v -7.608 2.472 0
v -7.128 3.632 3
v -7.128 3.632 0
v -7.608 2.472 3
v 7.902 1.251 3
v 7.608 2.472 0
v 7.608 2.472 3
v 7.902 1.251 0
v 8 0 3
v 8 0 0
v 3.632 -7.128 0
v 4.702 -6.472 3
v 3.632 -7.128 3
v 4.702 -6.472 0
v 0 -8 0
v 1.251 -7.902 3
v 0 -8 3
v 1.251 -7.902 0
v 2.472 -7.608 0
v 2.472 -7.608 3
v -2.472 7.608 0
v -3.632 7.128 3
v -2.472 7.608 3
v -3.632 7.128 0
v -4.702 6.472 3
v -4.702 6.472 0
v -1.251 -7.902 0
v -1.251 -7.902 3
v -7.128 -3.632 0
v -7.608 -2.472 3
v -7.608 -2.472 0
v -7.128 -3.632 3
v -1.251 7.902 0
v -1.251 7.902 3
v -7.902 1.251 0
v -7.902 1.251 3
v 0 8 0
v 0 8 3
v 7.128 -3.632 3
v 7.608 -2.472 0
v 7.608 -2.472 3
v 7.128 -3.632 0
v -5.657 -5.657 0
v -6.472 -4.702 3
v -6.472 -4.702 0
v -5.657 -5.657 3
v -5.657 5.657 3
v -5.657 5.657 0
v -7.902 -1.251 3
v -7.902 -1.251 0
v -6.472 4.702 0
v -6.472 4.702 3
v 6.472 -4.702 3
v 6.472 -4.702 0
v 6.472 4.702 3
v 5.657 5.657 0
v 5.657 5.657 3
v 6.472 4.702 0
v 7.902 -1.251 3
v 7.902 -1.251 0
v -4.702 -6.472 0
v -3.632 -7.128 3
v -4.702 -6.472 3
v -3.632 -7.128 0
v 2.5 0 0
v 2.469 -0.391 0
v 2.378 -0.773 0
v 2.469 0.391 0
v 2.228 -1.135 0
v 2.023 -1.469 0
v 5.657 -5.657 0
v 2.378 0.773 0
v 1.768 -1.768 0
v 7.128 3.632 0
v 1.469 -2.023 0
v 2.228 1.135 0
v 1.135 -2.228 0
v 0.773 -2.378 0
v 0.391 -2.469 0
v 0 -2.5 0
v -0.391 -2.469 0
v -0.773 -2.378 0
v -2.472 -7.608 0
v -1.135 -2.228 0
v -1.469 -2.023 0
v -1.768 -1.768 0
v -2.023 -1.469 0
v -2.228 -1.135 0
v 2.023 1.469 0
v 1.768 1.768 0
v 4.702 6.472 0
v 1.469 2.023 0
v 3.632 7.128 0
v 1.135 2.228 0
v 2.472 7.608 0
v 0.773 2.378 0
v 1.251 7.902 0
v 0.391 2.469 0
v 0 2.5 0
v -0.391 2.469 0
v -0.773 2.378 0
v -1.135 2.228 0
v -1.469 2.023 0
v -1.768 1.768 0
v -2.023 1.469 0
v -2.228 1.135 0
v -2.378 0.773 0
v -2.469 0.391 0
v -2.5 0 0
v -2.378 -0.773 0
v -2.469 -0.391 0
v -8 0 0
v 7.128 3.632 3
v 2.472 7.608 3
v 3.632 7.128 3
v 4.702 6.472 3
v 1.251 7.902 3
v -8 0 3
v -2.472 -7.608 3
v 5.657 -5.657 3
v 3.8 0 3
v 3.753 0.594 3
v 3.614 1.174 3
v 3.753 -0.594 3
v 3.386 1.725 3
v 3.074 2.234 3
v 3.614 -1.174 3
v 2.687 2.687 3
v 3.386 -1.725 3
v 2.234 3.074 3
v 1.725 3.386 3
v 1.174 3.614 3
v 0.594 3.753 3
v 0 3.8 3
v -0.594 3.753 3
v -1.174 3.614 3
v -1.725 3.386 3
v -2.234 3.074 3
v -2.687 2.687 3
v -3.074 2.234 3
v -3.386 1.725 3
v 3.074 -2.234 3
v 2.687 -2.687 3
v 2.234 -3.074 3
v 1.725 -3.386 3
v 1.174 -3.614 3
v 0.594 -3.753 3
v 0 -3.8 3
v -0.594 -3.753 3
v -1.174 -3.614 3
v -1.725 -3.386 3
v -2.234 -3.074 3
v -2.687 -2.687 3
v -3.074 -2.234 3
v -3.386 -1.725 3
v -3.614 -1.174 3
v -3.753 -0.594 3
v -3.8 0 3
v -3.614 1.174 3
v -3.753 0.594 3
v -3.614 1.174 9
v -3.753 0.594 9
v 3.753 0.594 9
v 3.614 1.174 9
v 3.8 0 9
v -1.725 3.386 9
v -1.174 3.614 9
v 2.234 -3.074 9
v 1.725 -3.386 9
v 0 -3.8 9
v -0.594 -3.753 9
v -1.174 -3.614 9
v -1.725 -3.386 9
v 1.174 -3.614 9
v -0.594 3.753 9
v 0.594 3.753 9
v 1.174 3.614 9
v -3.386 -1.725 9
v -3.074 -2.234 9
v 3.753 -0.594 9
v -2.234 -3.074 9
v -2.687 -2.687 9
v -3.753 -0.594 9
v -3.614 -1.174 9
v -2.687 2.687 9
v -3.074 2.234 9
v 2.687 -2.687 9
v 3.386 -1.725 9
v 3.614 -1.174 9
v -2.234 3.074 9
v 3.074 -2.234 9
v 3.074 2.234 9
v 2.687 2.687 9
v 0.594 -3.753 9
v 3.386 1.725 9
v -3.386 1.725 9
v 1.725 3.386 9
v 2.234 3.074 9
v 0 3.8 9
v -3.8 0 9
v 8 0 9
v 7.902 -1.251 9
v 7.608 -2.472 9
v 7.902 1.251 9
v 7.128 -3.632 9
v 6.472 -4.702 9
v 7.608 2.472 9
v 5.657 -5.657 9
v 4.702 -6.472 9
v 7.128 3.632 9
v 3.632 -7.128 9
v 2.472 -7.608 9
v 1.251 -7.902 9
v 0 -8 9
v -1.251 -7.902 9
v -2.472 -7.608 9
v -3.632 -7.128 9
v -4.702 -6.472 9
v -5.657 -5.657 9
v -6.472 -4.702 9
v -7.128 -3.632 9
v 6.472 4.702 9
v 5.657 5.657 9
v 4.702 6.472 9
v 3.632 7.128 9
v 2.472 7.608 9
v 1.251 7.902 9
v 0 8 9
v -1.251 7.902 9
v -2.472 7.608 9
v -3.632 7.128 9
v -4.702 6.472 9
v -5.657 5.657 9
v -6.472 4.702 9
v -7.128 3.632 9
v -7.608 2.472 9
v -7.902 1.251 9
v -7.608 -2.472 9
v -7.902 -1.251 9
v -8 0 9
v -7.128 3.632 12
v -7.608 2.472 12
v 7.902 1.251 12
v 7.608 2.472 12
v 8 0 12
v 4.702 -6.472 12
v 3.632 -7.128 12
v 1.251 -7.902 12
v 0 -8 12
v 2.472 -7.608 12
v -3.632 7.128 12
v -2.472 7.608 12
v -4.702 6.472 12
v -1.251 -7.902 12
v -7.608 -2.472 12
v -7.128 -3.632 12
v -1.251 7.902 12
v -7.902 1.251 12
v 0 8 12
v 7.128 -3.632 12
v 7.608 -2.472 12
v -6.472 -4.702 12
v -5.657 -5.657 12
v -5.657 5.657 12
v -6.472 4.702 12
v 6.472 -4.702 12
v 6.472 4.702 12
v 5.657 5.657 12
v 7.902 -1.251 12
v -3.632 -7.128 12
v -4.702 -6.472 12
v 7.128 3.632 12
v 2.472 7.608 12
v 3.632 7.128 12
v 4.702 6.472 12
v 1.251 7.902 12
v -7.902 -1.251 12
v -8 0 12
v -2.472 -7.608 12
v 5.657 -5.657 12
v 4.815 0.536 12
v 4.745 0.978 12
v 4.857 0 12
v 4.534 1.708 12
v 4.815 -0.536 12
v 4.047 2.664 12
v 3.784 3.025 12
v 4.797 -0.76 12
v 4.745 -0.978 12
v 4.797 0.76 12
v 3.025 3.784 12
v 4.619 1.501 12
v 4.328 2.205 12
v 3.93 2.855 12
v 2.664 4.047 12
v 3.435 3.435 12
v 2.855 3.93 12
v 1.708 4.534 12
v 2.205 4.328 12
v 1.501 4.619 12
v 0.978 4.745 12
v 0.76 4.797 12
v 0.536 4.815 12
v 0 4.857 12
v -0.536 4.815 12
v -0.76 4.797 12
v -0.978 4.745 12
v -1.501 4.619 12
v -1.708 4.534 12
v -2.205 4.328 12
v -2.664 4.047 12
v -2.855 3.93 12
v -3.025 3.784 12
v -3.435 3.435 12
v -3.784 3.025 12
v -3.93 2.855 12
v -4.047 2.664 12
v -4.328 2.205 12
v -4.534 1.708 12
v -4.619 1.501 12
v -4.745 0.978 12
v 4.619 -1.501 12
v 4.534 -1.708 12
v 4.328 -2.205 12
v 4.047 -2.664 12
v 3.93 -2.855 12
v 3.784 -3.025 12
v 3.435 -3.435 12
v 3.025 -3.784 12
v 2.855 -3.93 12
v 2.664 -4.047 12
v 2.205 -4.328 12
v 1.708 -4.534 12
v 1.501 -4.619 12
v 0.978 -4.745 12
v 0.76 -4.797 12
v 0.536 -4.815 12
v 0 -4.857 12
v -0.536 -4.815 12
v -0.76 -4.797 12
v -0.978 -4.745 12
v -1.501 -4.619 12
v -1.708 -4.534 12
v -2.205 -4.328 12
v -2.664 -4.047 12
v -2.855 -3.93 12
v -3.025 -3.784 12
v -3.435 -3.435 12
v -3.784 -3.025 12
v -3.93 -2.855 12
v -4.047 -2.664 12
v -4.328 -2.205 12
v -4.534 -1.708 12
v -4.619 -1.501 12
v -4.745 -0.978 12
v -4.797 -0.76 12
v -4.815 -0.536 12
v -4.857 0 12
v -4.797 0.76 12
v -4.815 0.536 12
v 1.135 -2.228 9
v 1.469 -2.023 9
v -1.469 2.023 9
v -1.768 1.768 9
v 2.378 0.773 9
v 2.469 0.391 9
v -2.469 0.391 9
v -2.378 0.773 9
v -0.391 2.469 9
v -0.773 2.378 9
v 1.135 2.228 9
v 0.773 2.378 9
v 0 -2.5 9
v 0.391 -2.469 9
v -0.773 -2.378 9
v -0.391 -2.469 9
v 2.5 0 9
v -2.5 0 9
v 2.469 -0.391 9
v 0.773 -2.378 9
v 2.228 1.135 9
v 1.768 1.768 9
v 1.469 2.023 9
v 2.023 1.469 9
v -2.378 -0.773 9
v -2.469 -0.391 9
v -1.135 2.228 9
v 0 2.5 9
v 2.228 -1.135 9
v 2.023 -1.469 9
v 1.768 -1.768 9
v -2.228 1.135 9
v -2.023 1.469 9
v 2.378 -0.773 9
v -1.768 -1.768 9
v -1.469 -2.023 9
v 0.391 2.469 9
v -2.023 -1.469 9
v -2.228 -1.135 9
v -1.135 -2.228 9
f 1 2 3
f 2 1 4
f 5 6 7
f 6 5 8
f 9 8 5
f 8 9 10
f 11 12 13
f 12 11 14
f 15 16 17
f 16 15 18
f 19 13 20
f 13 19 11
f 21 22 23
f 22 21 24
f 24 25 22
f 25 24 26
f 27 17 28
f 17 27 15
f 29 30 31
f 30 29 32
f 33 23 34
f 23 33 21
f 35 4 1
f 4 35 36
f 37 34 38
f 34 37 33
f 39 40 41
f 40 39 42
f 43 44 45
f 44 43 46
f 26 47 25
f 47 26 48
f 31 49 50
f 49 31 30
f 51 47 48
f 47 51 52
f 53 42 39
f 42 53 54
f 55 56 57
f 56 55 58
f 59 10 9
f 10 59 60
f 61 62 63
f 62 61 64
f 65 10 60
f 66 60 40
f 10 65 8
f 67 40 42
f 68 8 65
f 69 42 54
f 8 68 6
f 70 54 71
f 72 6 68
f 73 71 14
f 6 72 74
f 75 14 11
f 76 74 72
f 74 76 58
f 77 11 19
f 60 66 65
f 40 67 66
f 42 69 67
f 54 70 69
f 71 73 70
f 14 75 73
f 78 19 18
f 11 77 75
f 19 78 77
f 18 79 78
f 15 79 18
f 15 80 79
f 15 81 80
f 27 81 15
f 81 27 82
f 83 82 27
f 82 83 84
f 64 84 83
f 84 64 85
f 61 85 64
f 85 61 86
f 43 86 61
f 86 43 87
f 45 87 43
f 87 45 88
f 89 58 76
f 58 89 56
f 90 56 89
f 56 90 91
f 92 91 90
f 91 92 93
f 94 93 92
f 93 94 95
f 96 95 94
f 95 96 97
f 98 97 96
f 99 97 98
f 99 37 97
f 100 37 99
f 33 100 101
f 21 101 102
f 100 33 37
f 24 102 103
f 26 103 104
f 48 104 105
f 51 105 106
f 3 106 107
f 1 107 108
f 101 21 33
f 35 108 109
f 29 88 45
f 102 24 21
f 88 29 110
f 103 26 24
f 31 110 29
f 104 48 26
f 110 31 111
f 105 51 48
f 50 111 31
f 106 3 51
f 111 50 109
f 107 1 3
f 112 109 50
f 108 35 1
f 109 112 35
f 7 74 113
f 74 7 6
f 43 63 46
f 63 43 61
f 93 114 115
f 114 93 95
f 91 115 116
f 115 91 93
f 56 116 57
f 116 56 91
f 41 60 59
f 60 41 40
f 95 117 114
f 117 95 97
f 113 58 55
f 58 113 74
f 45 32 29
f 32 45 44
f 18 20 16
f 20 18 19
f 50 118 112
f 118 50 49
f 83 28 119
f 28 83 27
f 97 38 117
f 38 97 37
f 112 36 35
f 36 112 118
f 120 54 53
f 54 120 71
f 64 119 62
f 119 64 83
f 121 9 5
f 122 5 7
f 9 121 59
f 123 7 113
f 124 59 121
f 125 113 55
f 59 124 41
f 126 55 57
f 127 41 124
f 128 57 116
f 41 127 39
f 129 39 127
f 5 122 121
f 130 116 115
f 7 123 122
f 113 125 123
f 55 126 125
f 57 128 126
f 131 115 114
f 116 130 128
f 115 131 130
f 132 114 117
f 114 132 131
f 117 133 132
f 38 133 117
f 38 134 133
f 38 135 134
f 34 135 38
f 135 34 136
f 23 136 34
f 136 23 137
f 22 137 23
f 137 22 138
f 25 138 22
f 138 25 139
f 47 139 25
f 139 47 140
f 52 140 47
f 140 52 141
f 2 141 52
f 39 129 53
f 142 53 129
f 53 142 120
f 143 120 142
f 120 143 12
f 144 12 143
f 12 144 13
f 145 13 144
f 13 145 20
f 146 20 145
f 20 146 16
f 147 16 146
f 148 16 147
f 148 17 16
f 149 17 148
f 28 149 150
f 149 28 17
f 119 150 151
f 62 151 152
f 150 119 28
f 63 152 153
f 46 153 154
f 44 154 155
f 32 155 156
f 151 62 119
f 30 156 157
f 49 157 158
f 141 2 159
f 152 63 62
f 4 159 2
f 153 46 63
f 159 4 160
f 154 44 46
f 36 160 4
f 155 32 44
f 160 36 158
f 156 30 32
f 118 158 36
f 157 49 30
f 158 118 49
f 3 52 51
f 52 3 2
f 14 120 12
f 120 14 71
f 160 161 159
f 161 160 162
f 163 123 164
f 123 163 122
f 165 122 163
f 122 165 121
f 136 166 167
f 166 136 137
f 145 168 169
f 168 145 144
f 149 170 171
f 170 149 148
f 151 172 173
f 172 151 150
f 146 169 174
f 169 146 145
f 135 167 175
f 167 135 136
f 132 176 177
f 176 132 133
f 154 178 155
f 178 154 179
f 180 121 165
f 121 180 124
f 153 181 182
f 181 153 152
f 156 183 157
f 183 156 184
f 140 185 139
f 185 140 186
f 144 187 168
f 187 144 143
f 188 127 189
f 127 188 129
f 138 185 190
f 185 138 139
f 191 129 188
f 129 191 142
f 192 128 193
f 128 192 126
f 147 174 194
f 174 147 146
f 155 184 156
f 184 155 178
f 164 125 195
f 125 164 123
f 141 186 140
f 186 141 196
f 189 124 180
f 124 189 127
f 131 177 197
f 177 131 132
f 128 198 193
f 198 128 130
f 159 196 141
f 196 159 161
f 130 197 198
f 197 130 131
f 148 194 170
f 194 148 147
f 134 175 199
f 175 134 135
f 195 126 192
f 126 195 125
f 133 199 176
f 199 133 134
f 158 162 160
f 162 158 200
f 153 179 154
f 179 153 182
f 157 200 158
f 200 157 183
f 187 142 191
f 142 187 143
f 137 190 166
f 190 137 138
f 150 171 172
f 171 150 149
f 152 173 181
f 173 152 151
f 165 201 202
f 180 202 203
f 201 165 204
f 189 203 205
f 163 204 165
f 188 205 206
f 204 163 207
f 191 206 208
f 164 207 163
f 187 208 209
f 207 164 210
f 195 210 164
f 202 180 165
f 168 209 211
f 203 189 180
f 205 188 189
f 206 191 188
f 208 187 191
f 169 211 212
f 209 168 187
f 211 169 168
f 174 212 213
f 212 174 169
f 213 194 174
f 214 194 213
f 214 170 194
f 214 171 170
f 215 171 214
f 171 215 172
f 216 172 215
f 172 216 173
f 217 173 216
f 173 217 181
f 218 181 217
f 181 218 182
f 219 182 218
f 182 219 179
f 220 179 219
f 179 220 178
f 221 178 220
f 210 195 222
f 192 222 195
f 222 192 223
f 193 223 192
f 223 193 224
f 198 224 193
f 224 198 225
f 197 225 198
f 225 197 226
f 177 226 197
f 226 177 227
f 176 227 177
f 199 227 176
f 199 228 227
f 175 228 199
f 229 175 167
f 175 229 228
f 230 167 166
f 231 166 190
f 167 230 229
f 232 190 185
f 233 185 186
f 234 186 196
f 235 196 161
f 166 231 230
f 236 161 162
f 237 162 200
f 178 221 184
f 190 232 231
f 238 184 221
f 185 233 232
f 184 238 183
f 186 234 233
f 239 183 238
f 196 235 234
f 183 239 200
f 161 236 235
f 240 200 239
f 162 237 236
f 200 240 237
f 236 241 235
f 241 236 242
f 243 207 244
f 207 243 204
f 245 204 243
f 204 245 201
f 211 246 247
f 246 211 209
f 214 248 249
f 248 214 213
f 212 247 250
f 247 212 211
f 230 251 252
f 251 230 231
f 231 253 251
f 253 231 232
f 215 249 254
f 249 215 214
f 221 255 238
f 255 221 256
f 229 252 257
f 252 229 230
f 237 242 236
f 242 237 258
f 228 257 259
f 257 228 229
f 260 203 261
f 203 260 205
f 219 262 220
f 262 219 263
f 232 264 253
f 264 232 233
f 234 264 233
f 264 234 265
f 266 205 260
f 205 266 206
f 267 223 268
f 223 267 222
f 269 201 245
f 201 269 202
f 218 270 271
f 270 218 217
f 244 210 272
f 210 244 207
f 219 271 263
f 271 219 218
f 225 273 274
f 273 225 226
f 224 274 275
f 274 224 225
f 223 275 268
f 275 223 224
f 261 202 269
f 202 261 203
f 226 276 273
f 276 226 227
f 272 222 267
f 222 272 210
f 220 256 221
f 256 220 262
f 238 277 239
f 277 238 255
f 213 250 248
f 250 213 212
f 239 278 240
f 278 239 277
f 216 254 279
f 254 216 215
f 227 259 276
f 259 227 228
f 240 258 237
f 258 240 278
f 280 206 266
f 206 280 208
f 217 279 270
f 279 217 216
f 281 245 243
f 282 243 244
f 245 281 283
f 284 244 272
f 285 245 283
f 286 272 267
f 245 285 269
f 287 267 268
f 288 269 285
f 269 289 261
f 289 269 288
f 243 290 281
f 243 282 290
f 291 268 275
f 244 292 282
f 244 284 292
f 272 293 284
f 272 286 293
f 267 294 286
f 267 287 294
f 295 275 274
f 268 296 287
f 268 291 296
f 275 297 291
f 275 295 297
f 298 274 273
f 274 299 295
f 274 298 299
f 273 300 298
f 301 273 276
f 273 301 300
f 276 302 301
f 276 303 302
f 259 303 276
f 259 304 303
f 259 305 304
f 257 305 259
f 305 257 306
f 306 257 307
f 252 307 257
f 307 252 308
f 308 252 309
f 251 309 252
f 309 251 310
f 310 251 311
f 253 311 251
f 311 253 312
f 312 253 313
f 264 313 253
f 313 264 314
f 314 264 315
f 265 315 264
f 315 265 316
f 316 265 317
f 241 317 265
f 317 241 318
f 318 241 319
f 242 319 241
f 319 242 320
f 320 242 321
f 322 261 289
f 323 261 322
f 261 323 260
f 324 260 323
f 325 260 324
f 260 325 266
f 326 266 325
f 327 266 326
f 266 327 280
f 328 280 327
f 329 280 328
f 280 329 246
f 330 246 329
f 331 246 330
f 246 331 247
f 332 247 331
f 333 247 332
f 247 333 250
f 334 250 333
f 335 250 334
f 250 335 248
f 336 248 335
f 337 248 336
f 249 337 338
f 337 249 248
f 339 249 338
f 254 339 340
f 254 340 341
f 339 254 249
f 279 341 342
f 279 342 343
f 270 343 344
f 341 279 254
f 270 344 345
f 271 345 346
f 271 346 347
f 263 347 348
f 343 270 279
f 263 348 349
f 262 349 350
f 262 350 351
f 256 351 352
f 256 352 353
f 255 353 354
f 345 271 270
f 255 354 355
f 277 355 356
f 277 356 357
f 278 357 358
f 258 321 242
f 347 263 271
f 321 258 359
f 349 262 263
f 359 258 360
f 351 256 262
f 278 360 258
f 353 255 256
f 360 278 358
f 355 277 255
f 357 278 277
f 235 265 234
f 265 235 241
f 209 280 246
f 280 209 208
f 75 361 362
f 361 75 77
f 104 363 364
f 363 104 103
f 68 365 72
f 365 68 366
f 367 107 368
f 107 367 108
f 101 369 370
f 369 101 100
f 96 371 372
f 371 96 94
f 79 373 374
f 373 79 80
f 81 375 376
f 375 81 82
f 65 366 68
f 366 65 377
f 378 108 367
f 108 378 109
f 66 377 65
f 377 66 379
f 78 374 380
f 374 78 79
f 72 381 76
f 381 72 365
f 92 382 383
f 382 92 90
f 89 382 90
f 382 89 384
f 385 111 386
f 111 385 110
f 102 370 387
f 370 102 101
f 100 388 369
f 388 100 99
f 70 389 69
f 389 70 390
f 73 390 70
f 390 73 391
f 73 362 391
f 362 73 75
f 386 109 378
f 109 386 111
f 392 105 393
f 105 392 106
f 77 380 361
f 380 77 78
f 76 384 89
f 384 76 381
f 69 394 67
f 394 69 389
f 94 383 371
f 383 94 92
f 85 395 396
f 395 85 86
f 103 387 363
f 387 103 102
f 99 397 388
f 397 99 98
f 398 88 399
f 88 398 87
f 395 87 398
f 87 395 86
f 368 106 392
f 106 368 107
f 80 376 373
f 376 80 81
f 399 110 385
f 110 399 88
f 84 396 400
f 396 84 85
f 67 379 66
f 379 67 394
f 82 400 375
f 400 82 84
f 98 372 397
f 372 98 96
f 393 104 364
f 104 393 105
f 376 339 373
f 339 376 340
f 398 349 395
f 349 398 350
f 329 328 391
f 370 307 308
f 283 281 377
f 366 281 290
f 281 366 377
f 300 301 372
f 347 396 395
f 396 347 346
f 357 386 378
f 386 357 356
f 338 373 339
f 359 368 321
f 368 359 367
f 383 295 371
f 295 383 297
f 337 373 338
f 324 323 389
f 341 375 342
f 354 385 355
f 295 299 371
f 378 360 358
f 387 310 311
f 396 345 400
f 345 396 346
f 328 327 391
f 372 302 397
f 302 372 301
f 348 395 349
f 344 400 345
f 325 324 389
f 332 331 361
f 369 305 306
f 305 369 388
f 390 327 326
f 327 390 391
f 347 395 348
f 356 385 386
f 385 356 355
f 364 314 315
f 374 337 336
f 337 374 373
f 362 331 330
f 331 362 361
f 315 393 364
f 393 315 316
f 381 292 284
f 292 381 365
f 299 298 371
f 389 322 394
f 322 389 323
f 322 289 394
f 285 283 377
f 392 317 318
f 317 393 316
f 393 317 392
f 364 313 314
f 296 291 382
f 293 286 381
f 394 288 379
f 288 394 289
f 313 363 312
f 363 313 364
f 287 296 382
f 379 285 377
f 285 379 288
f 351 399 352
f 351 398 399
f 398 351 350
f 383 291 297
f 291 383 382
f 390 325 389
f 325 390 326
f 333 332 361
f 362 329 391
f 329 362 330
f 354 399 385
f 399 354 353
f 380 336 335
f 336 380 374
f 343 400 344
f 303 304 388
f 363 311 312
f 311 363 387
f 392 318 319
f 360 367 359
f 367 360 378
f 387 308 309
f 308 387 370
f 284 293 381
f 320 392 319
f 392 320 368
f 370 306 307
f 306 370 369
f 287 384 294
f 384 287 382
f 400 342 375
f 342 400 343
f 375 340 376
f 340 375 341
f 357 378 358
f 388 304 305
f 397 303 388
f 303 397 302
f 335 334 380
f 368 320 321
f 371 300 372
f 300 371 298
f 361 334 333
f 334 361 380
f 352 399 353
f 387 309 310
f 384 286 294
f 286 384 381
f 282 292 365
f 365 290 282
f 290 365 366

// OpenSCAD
/******************************************************************************/
/**********                     INFO                                 **********/
/******************************************************************************/
/*
Rail Button 1.0 April 2016
by David Buhler

Rail buttons or guides for model and high power rockets launching from 1010 or 
1515 size slot aluminum extrusions. ( https://www.8020.net/ ). These are not as 
strong as the delrin or nylon versions but hey you can easily make this yourself.
The 1515 guides are set to use 8-32 screws but could be opened up a bit for 
10-32 screws with a 3/16" drill bit.

Use support so the upper disk of the button is supported and straight. This is 
the portion that is inserted inside the rail and most critical for fit. 
Alternatively you could print these upside down and have the inside rail portion 
cleanly built. Your choice. I used three walls (1.2mm) . 

Attribution-NonCommercial 3.0 (CC BY-NC 3.0)
http://creativecommons.org/licenses/by-nc/3.0/

*/

/******************************************************************************/
/**********                     Settings                             **********/
/******************************************************************************/
//adjust the follow to meet your needs,  all measurements in mm.

/* [Select Button] */
button_to_make="1515";//[1010,1515,manual]

/* [Manual Button Diameters] */
man_button_outer_dia=11.1;//
man_button_inner_dia=5.8;//
man_thickness=1.9;//
man_button_middle=3.8;//
man_screw_size=3.05;//



/******************************************************************************/
/**********                   Variable Calcs                         **********/
/****                     no need to adjust these                      ********/
/******************************************************************************/
/* [HIDDEN] */
//1010 button, 
button_outer_dia=11.1;
button_inner_dia=5.8;
thickness=1.9;
button_middle=3.8;
screw_size=3.05;

//1515 button
button_outer_dia_1515=16;
button_inner_dia_1515=7.6;
thickness_1515=3;
button_middle_1515=6;
screw_size_1515=5;

/******************************************************************************/
/**********                  Make It Happen Stuff                    **********/
/******************************************************************************/
if (button_to_make=="1010"){
    difference(){
        union(){
            cylinder(r=button_outer_dia/2,h=thickness,$fn=40);//bottom disk
            translate([0,0,thickness]) 
                cylinder (r=button_inner_dia/2,h=button_middle,$fn=40);//middle slot
            translate([0,0,button_middle+thickness]) 
                cylinder (r=button_outer_dia/2,h=thickness,$fn=40);//top disk
        }
        translate([0,0,-1]) 
            cylinder (r=screw_size/2,h=50,$fn=40);//screw hole
        translate([0,0,button_middle+thickness]) 
            cylinder (r1=screw_size/2,r2=screw_size+3,h=button_middle+1,$fn=40);//screw head bevel
    }
}
else if(button_to_make=="1515"){
    difference(){
        union(){
            cylinder(r=button_outer_dia_1515/2,h=thickness_1515,$fn=40);//bottom disk
            translate([0,0,thickness_1515]) 
                cylinder (r=button_inner_dia_1515/2,h=button_middle_1515,$fn=40);//middle slot
            translate([0,0,button_middle_1515+thickness_1515]) 
                cylinder (r=button_outer_dia_1515/2,h=thickness_1515,$fn=40);//top disk
        }
        translate([0,0,-1]) 
            cylinder (r=screw_size_1515/2,h=50,$fn=40);//screw hole
        translate([0,0,button_middle_1515+thickness_1515]) 
            cylinder (r1=screw_size_1515/2,r2=screw_size_1515+3,h=button_middle_1515+1,$fn=40);//screw head bevel
    }
}
else if(button_to_make=="manual"){
    difference(){
        union(){
            cylinder(r=man_button_outer_dia/2,h=man_thickness,$fn=40);//bottom disk
            translate([0,0,man_thickness]) 
                cylinder (r=man_button_inner_dia/2,h=man_button_middle,$fn=40);//middle slot
            translate([0,0,man_button_middle+man_thickness]) 
                cylinder (r=man_button_outer_dia/2,h=man_thickness,$fn=40);//top disk
        }
        translate([0,0,-1]) 
            cylinder (r=man_screw_size/2,h=50,$fn=40);//screw hole
        translate([0,0,man_button_middle+man_thickness]) 
            cylinder (r1=man_screw_size/2,r2=man_screw_size+3,h=man_button_middle+1,$fn=40);//screw head bevel
    }
}
/******************************************************************************/
/**********                         Modules                          **********/
/******************************************************************************/
